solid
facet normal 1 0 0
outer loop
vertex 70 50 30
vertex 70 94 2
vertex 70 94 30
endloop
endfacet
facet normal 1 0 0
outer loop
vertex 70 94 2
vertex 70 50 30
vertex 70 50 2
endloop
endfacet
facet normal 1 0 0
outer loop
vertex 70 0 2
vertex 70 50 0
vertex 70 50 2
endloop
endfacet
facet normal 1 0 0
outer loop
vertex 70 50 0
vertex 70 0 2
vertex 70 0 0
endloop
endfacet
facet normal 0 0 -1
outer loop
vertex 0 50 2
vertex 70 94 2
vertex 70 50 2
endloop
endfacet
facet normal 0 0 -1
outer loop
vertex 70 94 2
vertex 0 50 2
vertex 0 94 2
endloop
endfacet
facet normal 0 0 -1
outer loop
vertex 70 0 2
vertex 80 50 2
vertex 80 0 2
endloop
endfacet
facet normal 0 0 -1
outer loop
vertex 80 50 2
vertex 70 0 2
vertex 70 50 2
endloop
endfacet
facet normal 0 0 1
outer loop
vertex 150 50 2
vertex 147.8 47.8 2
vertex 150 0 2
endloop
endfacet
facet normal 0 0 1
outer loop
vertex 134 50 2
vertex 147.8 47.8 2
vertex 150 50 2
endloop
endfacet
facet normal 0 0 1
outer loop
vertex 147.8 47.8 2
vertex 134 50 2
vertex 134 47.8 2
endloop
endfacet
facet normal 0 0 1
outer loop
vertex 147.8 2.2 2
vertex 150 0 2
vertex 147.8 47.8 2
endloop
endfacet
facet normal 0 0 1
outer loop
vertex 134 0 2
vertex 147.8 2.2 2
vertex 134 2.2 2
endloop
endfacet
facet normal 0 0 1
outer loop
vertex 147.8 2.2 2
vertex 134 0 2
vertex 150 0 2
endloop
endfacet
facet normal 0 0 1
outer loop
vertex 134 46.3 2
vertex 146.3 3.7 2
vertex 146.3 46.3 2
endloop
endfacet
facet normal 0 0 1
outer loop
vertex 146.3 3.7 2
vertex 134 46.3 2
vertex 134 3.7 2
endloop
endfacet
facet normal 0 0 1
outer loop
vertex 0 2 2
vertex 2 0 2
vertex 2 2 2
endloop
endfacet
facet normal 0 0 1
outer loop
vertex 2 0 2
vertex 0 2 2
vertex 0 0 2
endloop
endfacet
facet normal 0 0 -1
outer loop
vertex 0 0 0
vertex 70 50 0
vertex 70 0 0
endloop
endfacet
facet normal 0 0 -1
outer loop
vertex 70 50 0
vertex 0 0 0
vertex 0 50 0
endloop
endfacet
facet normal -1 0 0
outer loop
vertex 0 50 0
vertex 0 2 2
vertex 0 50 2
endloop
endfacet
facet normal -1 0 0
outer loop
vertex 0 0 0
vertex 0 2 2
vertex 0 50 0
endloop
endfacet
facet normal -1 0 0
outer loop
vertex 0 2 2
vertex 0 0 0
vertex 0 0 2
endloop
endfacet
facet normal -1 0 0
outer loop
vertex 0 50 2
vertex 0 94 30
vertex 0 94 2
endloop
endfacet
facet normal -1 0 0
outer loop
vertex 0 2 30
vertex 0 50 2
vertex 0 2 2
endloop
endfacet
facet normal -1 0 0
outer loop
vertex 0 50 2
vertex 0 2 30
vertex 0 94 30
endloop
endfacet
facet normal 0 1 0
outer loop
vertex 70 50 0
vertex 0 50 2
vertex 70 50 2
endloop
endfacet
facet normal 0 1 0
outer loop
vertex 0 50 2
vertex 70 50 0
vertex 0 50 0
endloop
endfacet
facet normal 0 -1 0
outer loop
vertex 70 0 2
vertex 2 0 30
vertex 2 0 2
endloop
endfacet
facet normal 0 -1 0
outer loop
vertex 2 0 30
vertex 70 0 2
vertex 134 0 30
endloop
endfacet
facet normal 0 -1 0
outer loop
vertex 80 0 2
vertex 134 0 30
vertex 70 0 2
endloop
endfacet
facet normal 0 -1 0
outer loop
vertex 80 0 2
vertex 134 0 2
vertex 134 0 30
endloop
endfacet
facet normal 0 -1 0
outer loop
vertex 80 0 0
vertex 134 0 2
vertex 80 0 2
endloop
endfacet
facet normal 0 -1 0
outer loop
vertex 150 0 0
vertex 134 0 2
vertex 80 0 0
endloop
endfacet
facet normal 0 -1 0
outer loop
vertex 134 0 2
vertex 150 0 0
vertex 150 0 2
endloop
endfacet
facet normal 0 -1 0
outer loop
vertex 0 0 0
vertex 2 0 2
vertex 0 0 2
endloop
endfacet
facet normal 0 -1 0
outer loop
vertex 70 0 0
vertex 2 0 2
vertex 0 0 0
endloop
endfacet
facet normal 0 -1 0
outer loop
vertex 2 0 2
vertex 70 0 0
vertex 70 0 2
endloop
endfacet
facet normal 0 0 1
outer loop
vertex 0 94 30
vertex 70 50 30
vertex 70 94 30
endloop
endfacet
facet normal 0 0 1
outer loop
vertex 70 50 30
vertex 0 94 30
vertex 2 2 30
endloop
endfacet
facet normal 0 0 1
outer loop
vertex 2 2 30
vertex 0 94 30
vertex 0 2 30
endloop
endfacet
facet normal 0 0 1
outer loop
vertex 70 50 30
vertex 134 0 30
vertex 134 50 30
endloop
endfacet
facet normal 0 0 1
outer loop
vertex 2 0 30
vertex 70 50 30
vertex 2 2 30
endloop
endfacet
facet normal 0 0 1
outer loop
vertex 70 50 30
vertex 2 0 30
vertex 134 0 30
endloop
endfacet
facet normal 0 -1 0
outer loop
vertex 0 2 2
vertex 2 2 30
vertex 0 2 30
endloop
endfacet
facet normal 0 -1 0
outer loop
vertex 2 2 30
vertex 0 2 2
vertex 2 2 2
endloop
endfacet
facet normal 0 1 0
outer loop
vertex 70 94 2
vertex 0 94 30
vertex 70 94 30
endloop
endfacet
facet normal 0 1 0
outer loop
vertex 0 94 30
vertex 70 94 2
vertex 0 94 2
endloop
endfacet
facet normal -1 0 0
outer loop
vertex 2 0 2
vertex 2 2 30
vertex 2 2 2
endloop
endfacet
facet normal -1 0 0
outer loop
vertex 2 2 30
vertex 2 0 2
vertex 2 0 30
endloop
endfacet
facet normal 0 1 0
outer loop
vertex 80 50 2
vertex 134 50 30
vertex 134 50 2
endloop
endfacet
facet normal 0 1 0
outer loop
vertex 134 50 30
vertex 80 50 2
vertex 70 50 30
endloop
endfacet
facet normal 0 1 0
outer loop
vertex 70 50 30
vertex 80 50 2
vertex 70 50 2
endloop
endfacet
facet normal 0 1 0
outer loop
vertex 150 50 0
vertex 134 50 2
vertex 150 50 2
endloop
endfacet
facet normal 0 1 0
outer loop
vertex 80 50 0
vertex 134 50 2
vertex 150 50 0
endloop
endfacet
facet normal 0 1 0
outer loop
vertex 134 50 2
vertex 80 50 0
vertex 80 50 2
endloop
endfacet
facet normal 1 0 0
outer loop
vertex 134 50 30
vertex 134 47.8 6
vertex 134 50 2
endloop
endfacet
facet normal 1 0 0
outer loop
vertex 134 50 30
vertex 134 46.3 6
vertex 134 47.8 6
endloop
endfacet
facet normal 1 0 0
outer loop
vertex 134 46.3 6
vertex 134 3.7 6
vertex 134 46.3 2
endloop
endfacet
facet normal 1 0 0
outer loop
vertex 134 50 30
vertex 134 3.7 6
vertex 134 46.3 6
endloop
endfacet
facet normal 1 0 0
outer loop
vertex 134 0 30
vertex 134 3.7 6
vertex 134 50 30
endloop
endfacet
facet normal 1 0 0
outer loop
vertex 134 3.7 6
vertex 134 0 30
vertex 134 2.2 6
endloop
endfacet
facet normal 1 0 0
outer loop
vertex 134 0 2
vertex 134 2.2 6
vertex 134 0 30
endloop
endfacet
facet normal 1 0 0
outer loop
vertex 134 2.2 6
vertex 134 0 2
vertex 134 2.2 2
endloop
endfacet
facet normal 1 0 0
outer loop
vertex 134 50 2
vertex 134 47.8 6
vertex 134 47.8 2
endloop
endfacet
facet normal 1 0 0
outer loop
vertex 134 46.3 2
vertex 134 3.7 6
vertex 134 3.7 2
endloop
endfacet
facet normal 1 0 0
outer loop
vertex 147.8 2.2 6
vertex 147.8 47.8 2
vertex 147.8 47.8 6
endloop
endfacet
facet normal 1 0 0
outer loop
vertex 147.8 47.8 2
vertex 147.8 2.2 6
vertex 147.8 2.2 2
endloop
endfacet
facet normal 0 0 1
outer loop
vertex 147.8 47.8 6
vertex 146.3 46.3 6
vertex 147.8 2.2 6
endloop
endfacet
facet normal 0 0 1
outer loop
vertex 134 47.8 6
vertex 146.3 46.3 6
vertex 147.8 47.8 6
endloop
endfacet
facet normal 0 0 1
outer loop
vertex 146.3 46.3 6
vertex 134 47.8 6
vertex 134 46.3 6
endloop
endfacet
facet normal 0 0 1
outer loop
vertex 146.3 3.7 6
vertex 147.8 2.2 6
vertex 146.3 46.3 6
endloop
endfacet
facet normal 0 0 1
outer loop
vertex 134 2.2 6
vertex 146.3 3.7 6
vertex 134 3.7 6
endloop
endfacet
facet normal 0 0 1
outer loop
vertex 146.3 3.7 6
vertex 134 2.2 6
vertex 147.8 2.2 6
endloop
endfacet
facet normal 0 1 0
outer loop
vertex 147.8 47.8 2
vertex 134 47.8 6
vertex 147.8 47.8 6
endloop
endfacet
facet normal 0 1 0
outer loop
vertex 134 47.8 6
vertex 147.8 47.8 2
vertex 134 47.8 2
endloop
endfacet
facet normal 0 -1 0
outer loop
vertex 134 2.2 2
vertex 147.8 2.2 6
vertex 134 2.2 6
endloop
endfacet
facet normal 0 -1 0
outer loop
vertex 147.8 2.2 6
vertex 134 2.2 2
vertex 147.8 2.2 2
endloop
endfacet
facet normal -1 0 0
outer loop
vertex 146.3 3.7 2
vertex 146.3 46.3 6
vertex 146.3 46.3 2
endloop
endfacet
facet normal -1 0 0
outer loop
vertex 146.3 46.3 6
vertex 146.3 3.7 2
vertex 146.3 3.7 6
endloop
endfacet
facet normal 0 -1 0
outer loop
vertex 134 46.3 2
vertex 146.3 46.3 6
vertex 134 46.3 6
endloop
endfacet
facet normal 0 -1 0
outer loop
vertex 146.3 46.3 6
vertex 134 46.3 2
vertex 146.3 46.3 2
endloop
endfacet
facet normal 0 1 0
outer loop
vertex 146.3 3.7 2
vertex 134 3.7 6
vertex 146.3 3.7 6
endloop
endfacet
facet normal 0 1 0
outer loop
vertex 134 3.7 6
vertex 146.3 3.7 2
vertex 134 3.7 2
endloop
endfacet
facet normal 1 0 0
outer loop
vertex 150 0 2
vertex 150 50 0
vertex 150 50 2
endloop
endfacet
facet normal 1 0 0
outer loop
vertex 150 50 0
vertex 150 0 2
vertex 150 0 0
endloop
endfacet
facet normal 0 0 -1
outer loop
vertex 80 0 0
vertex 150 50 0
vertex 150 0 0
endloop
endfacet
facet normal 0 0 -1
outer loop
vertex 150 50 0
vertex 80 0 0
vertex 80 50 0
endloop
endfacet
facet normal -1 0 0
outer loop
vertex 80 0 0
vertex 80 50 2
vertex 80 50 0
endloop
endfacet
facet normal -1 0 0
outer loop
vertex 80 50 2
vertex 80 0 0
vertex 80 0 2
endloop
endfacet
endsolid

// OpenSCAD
// Dimensions for the electronics enclosure
// Part 1: Box
$box_outer_x = 70;
$box_outer_y = 50;
$box_outer_z = 30;
$box_wall_thickness = 2;
$box_floor_thickness = 2;

// Part 2: Lid
$lid_plate_thickness = 2;
$lid_lip_thickness = 1.5;
$lid_lip_height = 4;
$lid_lip_outer_x = 65.6;
$lid_lip_outer_y = 45.6;

// Spacing between parts
$gap = 10;

// Print orientation: XY plane, Z up
$fn = 64;

// --- Part 1: The Box ---
module box() {
    // Calculate inner dimensions
    $box_inner_x = $box_outer_x - 2 * $box_wall_thickness;
    $box_inner_y = $box_outer_y - 2 * $box_wall_thickness;
    $box_inner_z = $box_outer_z - $box_floor_thickness;

    // Base plate
    translate([0, 0, 0])
        cube([$box_outer_x, $box_outer_y, $box_floor_thickness]);

    // Walls (4 sides)
    // Front wall (Y negative)
    translate([0, $box_wall_thickness, $box_floor_thickness])
        cube([$box_outer_x, $box_outer_y - 2 * $box_wall_thickness, $box_inner_z]);
    
    // Back wall (Y positive)
    translate([0, $box_outer_y - $box_wall_thickness, $box_floor_thickness])
        cube([$box_outer_x, $box_outer_y - 2 * $box_wall_thickness, $box_inner_z]);

    // Left wall (X negative)
    translate([$box_wall_thickness, 0, $box_floor_thickness])
        cube([$box_outer_x - 2 * $box_wall_thickness, $box_outer_y, $box_inner_z]);

    // Right wall (X positive)
    translate([$box_outer_x - $box_wall_thickness, 0, $box_floor_thickness])
        cube([$box_outer_x - 2 * $box_wall_thickness, $box_outer_y, $box_inner_z]);
}

// --- Part 2: The Lid ---
module lid() {
    // Calculate inner dimensions of the lip to ensure fit
    // The lip outer size is 65.6 x 45.6.
    // The lip thickness is 1.5.
    // The lip height is 4.
    
    // Base plate
    translate([0, 0, 0])
        cube([$box_outer_x, $box_outer_y, $lid_plate_thickness]);

    // Lip structure
    // Centered on the plate
    translate([
        ($box_outer_x - $lid_lip_outer_x) / 2,
        ($box_outer_y - $lid_lip_outer_y) / 2,
        $lid_plate_thickness
    ])
    // Create the hollow lip by subtracting the inner volume from a solid block
    // We use a difference operation to create the hollow channel
    difference() {
        // Solid block representing the lip outer dimensions
        cube([$lid_lip_outer_x, $lid_lip_outer_y, $lid_lip_height]);
        
        // Cutout for the hollow channel
        // Inner dimensions of the lip
        $lip_inner_x = $lid_lip_outer_x - 2 * $lid_lip_thickness;
        $lip_inner_y = $lid_lip_outer_y - 2 * $lid_lip_thickness;
        
        // Cutout extends slightly past the top to ensure clean edges
        translate([
            ($lid_lip_outer_x - $lip_inner_x) / 2,
            ($lid_lip_outer_y - $lip_inner_y) / 2,
            0
        ])
        cube([$lip_inner_x, $lip_inner_y, $lid_lip_height + 0.01]);
    }
}

// --- Assembly ---
// Place Box at origin (0,0,0)
translate([0, 0, 0])
    box();

// Place Lid on the +X side with 10mm gap
// Box center X is 0, Lid center X will be (Box Width/2 + Gap/2 + Lid Width/2)
// Actually, simpler: Box is at 0. Lid needs to be shifted.
// Box extends from -35 to +35 in X.
// Lid extends from -35 to +35 in X (relative to its center).
// Gap is 10mm.
// So Lid center X = Box Right Edge + Gap + (Lid Width / 2)
// Box Right Edge = 35.
// Lid Center X = 35 + 10 + 25 = 70.
// Wait, let's re-verify the "side by side" logic.
// Box: X range [-35, 35].
// Gap: 10mm.
// Lid: X range [35 + 10 - 25, 35 + 10 + 25] = [20, 70].
// Center of Lid = (20 + 70) / 2 = 45.
// Let's calculate the translation explicitly.
$box_half_x = $box_outer_x / 2;
$lid_half_x = $box_outer_x / 2; // Lid plate is same width as box
$center_x = $box_half_x + $gap + $lid_half_x;

translate([$center_x, 0, 0])
    lid();
